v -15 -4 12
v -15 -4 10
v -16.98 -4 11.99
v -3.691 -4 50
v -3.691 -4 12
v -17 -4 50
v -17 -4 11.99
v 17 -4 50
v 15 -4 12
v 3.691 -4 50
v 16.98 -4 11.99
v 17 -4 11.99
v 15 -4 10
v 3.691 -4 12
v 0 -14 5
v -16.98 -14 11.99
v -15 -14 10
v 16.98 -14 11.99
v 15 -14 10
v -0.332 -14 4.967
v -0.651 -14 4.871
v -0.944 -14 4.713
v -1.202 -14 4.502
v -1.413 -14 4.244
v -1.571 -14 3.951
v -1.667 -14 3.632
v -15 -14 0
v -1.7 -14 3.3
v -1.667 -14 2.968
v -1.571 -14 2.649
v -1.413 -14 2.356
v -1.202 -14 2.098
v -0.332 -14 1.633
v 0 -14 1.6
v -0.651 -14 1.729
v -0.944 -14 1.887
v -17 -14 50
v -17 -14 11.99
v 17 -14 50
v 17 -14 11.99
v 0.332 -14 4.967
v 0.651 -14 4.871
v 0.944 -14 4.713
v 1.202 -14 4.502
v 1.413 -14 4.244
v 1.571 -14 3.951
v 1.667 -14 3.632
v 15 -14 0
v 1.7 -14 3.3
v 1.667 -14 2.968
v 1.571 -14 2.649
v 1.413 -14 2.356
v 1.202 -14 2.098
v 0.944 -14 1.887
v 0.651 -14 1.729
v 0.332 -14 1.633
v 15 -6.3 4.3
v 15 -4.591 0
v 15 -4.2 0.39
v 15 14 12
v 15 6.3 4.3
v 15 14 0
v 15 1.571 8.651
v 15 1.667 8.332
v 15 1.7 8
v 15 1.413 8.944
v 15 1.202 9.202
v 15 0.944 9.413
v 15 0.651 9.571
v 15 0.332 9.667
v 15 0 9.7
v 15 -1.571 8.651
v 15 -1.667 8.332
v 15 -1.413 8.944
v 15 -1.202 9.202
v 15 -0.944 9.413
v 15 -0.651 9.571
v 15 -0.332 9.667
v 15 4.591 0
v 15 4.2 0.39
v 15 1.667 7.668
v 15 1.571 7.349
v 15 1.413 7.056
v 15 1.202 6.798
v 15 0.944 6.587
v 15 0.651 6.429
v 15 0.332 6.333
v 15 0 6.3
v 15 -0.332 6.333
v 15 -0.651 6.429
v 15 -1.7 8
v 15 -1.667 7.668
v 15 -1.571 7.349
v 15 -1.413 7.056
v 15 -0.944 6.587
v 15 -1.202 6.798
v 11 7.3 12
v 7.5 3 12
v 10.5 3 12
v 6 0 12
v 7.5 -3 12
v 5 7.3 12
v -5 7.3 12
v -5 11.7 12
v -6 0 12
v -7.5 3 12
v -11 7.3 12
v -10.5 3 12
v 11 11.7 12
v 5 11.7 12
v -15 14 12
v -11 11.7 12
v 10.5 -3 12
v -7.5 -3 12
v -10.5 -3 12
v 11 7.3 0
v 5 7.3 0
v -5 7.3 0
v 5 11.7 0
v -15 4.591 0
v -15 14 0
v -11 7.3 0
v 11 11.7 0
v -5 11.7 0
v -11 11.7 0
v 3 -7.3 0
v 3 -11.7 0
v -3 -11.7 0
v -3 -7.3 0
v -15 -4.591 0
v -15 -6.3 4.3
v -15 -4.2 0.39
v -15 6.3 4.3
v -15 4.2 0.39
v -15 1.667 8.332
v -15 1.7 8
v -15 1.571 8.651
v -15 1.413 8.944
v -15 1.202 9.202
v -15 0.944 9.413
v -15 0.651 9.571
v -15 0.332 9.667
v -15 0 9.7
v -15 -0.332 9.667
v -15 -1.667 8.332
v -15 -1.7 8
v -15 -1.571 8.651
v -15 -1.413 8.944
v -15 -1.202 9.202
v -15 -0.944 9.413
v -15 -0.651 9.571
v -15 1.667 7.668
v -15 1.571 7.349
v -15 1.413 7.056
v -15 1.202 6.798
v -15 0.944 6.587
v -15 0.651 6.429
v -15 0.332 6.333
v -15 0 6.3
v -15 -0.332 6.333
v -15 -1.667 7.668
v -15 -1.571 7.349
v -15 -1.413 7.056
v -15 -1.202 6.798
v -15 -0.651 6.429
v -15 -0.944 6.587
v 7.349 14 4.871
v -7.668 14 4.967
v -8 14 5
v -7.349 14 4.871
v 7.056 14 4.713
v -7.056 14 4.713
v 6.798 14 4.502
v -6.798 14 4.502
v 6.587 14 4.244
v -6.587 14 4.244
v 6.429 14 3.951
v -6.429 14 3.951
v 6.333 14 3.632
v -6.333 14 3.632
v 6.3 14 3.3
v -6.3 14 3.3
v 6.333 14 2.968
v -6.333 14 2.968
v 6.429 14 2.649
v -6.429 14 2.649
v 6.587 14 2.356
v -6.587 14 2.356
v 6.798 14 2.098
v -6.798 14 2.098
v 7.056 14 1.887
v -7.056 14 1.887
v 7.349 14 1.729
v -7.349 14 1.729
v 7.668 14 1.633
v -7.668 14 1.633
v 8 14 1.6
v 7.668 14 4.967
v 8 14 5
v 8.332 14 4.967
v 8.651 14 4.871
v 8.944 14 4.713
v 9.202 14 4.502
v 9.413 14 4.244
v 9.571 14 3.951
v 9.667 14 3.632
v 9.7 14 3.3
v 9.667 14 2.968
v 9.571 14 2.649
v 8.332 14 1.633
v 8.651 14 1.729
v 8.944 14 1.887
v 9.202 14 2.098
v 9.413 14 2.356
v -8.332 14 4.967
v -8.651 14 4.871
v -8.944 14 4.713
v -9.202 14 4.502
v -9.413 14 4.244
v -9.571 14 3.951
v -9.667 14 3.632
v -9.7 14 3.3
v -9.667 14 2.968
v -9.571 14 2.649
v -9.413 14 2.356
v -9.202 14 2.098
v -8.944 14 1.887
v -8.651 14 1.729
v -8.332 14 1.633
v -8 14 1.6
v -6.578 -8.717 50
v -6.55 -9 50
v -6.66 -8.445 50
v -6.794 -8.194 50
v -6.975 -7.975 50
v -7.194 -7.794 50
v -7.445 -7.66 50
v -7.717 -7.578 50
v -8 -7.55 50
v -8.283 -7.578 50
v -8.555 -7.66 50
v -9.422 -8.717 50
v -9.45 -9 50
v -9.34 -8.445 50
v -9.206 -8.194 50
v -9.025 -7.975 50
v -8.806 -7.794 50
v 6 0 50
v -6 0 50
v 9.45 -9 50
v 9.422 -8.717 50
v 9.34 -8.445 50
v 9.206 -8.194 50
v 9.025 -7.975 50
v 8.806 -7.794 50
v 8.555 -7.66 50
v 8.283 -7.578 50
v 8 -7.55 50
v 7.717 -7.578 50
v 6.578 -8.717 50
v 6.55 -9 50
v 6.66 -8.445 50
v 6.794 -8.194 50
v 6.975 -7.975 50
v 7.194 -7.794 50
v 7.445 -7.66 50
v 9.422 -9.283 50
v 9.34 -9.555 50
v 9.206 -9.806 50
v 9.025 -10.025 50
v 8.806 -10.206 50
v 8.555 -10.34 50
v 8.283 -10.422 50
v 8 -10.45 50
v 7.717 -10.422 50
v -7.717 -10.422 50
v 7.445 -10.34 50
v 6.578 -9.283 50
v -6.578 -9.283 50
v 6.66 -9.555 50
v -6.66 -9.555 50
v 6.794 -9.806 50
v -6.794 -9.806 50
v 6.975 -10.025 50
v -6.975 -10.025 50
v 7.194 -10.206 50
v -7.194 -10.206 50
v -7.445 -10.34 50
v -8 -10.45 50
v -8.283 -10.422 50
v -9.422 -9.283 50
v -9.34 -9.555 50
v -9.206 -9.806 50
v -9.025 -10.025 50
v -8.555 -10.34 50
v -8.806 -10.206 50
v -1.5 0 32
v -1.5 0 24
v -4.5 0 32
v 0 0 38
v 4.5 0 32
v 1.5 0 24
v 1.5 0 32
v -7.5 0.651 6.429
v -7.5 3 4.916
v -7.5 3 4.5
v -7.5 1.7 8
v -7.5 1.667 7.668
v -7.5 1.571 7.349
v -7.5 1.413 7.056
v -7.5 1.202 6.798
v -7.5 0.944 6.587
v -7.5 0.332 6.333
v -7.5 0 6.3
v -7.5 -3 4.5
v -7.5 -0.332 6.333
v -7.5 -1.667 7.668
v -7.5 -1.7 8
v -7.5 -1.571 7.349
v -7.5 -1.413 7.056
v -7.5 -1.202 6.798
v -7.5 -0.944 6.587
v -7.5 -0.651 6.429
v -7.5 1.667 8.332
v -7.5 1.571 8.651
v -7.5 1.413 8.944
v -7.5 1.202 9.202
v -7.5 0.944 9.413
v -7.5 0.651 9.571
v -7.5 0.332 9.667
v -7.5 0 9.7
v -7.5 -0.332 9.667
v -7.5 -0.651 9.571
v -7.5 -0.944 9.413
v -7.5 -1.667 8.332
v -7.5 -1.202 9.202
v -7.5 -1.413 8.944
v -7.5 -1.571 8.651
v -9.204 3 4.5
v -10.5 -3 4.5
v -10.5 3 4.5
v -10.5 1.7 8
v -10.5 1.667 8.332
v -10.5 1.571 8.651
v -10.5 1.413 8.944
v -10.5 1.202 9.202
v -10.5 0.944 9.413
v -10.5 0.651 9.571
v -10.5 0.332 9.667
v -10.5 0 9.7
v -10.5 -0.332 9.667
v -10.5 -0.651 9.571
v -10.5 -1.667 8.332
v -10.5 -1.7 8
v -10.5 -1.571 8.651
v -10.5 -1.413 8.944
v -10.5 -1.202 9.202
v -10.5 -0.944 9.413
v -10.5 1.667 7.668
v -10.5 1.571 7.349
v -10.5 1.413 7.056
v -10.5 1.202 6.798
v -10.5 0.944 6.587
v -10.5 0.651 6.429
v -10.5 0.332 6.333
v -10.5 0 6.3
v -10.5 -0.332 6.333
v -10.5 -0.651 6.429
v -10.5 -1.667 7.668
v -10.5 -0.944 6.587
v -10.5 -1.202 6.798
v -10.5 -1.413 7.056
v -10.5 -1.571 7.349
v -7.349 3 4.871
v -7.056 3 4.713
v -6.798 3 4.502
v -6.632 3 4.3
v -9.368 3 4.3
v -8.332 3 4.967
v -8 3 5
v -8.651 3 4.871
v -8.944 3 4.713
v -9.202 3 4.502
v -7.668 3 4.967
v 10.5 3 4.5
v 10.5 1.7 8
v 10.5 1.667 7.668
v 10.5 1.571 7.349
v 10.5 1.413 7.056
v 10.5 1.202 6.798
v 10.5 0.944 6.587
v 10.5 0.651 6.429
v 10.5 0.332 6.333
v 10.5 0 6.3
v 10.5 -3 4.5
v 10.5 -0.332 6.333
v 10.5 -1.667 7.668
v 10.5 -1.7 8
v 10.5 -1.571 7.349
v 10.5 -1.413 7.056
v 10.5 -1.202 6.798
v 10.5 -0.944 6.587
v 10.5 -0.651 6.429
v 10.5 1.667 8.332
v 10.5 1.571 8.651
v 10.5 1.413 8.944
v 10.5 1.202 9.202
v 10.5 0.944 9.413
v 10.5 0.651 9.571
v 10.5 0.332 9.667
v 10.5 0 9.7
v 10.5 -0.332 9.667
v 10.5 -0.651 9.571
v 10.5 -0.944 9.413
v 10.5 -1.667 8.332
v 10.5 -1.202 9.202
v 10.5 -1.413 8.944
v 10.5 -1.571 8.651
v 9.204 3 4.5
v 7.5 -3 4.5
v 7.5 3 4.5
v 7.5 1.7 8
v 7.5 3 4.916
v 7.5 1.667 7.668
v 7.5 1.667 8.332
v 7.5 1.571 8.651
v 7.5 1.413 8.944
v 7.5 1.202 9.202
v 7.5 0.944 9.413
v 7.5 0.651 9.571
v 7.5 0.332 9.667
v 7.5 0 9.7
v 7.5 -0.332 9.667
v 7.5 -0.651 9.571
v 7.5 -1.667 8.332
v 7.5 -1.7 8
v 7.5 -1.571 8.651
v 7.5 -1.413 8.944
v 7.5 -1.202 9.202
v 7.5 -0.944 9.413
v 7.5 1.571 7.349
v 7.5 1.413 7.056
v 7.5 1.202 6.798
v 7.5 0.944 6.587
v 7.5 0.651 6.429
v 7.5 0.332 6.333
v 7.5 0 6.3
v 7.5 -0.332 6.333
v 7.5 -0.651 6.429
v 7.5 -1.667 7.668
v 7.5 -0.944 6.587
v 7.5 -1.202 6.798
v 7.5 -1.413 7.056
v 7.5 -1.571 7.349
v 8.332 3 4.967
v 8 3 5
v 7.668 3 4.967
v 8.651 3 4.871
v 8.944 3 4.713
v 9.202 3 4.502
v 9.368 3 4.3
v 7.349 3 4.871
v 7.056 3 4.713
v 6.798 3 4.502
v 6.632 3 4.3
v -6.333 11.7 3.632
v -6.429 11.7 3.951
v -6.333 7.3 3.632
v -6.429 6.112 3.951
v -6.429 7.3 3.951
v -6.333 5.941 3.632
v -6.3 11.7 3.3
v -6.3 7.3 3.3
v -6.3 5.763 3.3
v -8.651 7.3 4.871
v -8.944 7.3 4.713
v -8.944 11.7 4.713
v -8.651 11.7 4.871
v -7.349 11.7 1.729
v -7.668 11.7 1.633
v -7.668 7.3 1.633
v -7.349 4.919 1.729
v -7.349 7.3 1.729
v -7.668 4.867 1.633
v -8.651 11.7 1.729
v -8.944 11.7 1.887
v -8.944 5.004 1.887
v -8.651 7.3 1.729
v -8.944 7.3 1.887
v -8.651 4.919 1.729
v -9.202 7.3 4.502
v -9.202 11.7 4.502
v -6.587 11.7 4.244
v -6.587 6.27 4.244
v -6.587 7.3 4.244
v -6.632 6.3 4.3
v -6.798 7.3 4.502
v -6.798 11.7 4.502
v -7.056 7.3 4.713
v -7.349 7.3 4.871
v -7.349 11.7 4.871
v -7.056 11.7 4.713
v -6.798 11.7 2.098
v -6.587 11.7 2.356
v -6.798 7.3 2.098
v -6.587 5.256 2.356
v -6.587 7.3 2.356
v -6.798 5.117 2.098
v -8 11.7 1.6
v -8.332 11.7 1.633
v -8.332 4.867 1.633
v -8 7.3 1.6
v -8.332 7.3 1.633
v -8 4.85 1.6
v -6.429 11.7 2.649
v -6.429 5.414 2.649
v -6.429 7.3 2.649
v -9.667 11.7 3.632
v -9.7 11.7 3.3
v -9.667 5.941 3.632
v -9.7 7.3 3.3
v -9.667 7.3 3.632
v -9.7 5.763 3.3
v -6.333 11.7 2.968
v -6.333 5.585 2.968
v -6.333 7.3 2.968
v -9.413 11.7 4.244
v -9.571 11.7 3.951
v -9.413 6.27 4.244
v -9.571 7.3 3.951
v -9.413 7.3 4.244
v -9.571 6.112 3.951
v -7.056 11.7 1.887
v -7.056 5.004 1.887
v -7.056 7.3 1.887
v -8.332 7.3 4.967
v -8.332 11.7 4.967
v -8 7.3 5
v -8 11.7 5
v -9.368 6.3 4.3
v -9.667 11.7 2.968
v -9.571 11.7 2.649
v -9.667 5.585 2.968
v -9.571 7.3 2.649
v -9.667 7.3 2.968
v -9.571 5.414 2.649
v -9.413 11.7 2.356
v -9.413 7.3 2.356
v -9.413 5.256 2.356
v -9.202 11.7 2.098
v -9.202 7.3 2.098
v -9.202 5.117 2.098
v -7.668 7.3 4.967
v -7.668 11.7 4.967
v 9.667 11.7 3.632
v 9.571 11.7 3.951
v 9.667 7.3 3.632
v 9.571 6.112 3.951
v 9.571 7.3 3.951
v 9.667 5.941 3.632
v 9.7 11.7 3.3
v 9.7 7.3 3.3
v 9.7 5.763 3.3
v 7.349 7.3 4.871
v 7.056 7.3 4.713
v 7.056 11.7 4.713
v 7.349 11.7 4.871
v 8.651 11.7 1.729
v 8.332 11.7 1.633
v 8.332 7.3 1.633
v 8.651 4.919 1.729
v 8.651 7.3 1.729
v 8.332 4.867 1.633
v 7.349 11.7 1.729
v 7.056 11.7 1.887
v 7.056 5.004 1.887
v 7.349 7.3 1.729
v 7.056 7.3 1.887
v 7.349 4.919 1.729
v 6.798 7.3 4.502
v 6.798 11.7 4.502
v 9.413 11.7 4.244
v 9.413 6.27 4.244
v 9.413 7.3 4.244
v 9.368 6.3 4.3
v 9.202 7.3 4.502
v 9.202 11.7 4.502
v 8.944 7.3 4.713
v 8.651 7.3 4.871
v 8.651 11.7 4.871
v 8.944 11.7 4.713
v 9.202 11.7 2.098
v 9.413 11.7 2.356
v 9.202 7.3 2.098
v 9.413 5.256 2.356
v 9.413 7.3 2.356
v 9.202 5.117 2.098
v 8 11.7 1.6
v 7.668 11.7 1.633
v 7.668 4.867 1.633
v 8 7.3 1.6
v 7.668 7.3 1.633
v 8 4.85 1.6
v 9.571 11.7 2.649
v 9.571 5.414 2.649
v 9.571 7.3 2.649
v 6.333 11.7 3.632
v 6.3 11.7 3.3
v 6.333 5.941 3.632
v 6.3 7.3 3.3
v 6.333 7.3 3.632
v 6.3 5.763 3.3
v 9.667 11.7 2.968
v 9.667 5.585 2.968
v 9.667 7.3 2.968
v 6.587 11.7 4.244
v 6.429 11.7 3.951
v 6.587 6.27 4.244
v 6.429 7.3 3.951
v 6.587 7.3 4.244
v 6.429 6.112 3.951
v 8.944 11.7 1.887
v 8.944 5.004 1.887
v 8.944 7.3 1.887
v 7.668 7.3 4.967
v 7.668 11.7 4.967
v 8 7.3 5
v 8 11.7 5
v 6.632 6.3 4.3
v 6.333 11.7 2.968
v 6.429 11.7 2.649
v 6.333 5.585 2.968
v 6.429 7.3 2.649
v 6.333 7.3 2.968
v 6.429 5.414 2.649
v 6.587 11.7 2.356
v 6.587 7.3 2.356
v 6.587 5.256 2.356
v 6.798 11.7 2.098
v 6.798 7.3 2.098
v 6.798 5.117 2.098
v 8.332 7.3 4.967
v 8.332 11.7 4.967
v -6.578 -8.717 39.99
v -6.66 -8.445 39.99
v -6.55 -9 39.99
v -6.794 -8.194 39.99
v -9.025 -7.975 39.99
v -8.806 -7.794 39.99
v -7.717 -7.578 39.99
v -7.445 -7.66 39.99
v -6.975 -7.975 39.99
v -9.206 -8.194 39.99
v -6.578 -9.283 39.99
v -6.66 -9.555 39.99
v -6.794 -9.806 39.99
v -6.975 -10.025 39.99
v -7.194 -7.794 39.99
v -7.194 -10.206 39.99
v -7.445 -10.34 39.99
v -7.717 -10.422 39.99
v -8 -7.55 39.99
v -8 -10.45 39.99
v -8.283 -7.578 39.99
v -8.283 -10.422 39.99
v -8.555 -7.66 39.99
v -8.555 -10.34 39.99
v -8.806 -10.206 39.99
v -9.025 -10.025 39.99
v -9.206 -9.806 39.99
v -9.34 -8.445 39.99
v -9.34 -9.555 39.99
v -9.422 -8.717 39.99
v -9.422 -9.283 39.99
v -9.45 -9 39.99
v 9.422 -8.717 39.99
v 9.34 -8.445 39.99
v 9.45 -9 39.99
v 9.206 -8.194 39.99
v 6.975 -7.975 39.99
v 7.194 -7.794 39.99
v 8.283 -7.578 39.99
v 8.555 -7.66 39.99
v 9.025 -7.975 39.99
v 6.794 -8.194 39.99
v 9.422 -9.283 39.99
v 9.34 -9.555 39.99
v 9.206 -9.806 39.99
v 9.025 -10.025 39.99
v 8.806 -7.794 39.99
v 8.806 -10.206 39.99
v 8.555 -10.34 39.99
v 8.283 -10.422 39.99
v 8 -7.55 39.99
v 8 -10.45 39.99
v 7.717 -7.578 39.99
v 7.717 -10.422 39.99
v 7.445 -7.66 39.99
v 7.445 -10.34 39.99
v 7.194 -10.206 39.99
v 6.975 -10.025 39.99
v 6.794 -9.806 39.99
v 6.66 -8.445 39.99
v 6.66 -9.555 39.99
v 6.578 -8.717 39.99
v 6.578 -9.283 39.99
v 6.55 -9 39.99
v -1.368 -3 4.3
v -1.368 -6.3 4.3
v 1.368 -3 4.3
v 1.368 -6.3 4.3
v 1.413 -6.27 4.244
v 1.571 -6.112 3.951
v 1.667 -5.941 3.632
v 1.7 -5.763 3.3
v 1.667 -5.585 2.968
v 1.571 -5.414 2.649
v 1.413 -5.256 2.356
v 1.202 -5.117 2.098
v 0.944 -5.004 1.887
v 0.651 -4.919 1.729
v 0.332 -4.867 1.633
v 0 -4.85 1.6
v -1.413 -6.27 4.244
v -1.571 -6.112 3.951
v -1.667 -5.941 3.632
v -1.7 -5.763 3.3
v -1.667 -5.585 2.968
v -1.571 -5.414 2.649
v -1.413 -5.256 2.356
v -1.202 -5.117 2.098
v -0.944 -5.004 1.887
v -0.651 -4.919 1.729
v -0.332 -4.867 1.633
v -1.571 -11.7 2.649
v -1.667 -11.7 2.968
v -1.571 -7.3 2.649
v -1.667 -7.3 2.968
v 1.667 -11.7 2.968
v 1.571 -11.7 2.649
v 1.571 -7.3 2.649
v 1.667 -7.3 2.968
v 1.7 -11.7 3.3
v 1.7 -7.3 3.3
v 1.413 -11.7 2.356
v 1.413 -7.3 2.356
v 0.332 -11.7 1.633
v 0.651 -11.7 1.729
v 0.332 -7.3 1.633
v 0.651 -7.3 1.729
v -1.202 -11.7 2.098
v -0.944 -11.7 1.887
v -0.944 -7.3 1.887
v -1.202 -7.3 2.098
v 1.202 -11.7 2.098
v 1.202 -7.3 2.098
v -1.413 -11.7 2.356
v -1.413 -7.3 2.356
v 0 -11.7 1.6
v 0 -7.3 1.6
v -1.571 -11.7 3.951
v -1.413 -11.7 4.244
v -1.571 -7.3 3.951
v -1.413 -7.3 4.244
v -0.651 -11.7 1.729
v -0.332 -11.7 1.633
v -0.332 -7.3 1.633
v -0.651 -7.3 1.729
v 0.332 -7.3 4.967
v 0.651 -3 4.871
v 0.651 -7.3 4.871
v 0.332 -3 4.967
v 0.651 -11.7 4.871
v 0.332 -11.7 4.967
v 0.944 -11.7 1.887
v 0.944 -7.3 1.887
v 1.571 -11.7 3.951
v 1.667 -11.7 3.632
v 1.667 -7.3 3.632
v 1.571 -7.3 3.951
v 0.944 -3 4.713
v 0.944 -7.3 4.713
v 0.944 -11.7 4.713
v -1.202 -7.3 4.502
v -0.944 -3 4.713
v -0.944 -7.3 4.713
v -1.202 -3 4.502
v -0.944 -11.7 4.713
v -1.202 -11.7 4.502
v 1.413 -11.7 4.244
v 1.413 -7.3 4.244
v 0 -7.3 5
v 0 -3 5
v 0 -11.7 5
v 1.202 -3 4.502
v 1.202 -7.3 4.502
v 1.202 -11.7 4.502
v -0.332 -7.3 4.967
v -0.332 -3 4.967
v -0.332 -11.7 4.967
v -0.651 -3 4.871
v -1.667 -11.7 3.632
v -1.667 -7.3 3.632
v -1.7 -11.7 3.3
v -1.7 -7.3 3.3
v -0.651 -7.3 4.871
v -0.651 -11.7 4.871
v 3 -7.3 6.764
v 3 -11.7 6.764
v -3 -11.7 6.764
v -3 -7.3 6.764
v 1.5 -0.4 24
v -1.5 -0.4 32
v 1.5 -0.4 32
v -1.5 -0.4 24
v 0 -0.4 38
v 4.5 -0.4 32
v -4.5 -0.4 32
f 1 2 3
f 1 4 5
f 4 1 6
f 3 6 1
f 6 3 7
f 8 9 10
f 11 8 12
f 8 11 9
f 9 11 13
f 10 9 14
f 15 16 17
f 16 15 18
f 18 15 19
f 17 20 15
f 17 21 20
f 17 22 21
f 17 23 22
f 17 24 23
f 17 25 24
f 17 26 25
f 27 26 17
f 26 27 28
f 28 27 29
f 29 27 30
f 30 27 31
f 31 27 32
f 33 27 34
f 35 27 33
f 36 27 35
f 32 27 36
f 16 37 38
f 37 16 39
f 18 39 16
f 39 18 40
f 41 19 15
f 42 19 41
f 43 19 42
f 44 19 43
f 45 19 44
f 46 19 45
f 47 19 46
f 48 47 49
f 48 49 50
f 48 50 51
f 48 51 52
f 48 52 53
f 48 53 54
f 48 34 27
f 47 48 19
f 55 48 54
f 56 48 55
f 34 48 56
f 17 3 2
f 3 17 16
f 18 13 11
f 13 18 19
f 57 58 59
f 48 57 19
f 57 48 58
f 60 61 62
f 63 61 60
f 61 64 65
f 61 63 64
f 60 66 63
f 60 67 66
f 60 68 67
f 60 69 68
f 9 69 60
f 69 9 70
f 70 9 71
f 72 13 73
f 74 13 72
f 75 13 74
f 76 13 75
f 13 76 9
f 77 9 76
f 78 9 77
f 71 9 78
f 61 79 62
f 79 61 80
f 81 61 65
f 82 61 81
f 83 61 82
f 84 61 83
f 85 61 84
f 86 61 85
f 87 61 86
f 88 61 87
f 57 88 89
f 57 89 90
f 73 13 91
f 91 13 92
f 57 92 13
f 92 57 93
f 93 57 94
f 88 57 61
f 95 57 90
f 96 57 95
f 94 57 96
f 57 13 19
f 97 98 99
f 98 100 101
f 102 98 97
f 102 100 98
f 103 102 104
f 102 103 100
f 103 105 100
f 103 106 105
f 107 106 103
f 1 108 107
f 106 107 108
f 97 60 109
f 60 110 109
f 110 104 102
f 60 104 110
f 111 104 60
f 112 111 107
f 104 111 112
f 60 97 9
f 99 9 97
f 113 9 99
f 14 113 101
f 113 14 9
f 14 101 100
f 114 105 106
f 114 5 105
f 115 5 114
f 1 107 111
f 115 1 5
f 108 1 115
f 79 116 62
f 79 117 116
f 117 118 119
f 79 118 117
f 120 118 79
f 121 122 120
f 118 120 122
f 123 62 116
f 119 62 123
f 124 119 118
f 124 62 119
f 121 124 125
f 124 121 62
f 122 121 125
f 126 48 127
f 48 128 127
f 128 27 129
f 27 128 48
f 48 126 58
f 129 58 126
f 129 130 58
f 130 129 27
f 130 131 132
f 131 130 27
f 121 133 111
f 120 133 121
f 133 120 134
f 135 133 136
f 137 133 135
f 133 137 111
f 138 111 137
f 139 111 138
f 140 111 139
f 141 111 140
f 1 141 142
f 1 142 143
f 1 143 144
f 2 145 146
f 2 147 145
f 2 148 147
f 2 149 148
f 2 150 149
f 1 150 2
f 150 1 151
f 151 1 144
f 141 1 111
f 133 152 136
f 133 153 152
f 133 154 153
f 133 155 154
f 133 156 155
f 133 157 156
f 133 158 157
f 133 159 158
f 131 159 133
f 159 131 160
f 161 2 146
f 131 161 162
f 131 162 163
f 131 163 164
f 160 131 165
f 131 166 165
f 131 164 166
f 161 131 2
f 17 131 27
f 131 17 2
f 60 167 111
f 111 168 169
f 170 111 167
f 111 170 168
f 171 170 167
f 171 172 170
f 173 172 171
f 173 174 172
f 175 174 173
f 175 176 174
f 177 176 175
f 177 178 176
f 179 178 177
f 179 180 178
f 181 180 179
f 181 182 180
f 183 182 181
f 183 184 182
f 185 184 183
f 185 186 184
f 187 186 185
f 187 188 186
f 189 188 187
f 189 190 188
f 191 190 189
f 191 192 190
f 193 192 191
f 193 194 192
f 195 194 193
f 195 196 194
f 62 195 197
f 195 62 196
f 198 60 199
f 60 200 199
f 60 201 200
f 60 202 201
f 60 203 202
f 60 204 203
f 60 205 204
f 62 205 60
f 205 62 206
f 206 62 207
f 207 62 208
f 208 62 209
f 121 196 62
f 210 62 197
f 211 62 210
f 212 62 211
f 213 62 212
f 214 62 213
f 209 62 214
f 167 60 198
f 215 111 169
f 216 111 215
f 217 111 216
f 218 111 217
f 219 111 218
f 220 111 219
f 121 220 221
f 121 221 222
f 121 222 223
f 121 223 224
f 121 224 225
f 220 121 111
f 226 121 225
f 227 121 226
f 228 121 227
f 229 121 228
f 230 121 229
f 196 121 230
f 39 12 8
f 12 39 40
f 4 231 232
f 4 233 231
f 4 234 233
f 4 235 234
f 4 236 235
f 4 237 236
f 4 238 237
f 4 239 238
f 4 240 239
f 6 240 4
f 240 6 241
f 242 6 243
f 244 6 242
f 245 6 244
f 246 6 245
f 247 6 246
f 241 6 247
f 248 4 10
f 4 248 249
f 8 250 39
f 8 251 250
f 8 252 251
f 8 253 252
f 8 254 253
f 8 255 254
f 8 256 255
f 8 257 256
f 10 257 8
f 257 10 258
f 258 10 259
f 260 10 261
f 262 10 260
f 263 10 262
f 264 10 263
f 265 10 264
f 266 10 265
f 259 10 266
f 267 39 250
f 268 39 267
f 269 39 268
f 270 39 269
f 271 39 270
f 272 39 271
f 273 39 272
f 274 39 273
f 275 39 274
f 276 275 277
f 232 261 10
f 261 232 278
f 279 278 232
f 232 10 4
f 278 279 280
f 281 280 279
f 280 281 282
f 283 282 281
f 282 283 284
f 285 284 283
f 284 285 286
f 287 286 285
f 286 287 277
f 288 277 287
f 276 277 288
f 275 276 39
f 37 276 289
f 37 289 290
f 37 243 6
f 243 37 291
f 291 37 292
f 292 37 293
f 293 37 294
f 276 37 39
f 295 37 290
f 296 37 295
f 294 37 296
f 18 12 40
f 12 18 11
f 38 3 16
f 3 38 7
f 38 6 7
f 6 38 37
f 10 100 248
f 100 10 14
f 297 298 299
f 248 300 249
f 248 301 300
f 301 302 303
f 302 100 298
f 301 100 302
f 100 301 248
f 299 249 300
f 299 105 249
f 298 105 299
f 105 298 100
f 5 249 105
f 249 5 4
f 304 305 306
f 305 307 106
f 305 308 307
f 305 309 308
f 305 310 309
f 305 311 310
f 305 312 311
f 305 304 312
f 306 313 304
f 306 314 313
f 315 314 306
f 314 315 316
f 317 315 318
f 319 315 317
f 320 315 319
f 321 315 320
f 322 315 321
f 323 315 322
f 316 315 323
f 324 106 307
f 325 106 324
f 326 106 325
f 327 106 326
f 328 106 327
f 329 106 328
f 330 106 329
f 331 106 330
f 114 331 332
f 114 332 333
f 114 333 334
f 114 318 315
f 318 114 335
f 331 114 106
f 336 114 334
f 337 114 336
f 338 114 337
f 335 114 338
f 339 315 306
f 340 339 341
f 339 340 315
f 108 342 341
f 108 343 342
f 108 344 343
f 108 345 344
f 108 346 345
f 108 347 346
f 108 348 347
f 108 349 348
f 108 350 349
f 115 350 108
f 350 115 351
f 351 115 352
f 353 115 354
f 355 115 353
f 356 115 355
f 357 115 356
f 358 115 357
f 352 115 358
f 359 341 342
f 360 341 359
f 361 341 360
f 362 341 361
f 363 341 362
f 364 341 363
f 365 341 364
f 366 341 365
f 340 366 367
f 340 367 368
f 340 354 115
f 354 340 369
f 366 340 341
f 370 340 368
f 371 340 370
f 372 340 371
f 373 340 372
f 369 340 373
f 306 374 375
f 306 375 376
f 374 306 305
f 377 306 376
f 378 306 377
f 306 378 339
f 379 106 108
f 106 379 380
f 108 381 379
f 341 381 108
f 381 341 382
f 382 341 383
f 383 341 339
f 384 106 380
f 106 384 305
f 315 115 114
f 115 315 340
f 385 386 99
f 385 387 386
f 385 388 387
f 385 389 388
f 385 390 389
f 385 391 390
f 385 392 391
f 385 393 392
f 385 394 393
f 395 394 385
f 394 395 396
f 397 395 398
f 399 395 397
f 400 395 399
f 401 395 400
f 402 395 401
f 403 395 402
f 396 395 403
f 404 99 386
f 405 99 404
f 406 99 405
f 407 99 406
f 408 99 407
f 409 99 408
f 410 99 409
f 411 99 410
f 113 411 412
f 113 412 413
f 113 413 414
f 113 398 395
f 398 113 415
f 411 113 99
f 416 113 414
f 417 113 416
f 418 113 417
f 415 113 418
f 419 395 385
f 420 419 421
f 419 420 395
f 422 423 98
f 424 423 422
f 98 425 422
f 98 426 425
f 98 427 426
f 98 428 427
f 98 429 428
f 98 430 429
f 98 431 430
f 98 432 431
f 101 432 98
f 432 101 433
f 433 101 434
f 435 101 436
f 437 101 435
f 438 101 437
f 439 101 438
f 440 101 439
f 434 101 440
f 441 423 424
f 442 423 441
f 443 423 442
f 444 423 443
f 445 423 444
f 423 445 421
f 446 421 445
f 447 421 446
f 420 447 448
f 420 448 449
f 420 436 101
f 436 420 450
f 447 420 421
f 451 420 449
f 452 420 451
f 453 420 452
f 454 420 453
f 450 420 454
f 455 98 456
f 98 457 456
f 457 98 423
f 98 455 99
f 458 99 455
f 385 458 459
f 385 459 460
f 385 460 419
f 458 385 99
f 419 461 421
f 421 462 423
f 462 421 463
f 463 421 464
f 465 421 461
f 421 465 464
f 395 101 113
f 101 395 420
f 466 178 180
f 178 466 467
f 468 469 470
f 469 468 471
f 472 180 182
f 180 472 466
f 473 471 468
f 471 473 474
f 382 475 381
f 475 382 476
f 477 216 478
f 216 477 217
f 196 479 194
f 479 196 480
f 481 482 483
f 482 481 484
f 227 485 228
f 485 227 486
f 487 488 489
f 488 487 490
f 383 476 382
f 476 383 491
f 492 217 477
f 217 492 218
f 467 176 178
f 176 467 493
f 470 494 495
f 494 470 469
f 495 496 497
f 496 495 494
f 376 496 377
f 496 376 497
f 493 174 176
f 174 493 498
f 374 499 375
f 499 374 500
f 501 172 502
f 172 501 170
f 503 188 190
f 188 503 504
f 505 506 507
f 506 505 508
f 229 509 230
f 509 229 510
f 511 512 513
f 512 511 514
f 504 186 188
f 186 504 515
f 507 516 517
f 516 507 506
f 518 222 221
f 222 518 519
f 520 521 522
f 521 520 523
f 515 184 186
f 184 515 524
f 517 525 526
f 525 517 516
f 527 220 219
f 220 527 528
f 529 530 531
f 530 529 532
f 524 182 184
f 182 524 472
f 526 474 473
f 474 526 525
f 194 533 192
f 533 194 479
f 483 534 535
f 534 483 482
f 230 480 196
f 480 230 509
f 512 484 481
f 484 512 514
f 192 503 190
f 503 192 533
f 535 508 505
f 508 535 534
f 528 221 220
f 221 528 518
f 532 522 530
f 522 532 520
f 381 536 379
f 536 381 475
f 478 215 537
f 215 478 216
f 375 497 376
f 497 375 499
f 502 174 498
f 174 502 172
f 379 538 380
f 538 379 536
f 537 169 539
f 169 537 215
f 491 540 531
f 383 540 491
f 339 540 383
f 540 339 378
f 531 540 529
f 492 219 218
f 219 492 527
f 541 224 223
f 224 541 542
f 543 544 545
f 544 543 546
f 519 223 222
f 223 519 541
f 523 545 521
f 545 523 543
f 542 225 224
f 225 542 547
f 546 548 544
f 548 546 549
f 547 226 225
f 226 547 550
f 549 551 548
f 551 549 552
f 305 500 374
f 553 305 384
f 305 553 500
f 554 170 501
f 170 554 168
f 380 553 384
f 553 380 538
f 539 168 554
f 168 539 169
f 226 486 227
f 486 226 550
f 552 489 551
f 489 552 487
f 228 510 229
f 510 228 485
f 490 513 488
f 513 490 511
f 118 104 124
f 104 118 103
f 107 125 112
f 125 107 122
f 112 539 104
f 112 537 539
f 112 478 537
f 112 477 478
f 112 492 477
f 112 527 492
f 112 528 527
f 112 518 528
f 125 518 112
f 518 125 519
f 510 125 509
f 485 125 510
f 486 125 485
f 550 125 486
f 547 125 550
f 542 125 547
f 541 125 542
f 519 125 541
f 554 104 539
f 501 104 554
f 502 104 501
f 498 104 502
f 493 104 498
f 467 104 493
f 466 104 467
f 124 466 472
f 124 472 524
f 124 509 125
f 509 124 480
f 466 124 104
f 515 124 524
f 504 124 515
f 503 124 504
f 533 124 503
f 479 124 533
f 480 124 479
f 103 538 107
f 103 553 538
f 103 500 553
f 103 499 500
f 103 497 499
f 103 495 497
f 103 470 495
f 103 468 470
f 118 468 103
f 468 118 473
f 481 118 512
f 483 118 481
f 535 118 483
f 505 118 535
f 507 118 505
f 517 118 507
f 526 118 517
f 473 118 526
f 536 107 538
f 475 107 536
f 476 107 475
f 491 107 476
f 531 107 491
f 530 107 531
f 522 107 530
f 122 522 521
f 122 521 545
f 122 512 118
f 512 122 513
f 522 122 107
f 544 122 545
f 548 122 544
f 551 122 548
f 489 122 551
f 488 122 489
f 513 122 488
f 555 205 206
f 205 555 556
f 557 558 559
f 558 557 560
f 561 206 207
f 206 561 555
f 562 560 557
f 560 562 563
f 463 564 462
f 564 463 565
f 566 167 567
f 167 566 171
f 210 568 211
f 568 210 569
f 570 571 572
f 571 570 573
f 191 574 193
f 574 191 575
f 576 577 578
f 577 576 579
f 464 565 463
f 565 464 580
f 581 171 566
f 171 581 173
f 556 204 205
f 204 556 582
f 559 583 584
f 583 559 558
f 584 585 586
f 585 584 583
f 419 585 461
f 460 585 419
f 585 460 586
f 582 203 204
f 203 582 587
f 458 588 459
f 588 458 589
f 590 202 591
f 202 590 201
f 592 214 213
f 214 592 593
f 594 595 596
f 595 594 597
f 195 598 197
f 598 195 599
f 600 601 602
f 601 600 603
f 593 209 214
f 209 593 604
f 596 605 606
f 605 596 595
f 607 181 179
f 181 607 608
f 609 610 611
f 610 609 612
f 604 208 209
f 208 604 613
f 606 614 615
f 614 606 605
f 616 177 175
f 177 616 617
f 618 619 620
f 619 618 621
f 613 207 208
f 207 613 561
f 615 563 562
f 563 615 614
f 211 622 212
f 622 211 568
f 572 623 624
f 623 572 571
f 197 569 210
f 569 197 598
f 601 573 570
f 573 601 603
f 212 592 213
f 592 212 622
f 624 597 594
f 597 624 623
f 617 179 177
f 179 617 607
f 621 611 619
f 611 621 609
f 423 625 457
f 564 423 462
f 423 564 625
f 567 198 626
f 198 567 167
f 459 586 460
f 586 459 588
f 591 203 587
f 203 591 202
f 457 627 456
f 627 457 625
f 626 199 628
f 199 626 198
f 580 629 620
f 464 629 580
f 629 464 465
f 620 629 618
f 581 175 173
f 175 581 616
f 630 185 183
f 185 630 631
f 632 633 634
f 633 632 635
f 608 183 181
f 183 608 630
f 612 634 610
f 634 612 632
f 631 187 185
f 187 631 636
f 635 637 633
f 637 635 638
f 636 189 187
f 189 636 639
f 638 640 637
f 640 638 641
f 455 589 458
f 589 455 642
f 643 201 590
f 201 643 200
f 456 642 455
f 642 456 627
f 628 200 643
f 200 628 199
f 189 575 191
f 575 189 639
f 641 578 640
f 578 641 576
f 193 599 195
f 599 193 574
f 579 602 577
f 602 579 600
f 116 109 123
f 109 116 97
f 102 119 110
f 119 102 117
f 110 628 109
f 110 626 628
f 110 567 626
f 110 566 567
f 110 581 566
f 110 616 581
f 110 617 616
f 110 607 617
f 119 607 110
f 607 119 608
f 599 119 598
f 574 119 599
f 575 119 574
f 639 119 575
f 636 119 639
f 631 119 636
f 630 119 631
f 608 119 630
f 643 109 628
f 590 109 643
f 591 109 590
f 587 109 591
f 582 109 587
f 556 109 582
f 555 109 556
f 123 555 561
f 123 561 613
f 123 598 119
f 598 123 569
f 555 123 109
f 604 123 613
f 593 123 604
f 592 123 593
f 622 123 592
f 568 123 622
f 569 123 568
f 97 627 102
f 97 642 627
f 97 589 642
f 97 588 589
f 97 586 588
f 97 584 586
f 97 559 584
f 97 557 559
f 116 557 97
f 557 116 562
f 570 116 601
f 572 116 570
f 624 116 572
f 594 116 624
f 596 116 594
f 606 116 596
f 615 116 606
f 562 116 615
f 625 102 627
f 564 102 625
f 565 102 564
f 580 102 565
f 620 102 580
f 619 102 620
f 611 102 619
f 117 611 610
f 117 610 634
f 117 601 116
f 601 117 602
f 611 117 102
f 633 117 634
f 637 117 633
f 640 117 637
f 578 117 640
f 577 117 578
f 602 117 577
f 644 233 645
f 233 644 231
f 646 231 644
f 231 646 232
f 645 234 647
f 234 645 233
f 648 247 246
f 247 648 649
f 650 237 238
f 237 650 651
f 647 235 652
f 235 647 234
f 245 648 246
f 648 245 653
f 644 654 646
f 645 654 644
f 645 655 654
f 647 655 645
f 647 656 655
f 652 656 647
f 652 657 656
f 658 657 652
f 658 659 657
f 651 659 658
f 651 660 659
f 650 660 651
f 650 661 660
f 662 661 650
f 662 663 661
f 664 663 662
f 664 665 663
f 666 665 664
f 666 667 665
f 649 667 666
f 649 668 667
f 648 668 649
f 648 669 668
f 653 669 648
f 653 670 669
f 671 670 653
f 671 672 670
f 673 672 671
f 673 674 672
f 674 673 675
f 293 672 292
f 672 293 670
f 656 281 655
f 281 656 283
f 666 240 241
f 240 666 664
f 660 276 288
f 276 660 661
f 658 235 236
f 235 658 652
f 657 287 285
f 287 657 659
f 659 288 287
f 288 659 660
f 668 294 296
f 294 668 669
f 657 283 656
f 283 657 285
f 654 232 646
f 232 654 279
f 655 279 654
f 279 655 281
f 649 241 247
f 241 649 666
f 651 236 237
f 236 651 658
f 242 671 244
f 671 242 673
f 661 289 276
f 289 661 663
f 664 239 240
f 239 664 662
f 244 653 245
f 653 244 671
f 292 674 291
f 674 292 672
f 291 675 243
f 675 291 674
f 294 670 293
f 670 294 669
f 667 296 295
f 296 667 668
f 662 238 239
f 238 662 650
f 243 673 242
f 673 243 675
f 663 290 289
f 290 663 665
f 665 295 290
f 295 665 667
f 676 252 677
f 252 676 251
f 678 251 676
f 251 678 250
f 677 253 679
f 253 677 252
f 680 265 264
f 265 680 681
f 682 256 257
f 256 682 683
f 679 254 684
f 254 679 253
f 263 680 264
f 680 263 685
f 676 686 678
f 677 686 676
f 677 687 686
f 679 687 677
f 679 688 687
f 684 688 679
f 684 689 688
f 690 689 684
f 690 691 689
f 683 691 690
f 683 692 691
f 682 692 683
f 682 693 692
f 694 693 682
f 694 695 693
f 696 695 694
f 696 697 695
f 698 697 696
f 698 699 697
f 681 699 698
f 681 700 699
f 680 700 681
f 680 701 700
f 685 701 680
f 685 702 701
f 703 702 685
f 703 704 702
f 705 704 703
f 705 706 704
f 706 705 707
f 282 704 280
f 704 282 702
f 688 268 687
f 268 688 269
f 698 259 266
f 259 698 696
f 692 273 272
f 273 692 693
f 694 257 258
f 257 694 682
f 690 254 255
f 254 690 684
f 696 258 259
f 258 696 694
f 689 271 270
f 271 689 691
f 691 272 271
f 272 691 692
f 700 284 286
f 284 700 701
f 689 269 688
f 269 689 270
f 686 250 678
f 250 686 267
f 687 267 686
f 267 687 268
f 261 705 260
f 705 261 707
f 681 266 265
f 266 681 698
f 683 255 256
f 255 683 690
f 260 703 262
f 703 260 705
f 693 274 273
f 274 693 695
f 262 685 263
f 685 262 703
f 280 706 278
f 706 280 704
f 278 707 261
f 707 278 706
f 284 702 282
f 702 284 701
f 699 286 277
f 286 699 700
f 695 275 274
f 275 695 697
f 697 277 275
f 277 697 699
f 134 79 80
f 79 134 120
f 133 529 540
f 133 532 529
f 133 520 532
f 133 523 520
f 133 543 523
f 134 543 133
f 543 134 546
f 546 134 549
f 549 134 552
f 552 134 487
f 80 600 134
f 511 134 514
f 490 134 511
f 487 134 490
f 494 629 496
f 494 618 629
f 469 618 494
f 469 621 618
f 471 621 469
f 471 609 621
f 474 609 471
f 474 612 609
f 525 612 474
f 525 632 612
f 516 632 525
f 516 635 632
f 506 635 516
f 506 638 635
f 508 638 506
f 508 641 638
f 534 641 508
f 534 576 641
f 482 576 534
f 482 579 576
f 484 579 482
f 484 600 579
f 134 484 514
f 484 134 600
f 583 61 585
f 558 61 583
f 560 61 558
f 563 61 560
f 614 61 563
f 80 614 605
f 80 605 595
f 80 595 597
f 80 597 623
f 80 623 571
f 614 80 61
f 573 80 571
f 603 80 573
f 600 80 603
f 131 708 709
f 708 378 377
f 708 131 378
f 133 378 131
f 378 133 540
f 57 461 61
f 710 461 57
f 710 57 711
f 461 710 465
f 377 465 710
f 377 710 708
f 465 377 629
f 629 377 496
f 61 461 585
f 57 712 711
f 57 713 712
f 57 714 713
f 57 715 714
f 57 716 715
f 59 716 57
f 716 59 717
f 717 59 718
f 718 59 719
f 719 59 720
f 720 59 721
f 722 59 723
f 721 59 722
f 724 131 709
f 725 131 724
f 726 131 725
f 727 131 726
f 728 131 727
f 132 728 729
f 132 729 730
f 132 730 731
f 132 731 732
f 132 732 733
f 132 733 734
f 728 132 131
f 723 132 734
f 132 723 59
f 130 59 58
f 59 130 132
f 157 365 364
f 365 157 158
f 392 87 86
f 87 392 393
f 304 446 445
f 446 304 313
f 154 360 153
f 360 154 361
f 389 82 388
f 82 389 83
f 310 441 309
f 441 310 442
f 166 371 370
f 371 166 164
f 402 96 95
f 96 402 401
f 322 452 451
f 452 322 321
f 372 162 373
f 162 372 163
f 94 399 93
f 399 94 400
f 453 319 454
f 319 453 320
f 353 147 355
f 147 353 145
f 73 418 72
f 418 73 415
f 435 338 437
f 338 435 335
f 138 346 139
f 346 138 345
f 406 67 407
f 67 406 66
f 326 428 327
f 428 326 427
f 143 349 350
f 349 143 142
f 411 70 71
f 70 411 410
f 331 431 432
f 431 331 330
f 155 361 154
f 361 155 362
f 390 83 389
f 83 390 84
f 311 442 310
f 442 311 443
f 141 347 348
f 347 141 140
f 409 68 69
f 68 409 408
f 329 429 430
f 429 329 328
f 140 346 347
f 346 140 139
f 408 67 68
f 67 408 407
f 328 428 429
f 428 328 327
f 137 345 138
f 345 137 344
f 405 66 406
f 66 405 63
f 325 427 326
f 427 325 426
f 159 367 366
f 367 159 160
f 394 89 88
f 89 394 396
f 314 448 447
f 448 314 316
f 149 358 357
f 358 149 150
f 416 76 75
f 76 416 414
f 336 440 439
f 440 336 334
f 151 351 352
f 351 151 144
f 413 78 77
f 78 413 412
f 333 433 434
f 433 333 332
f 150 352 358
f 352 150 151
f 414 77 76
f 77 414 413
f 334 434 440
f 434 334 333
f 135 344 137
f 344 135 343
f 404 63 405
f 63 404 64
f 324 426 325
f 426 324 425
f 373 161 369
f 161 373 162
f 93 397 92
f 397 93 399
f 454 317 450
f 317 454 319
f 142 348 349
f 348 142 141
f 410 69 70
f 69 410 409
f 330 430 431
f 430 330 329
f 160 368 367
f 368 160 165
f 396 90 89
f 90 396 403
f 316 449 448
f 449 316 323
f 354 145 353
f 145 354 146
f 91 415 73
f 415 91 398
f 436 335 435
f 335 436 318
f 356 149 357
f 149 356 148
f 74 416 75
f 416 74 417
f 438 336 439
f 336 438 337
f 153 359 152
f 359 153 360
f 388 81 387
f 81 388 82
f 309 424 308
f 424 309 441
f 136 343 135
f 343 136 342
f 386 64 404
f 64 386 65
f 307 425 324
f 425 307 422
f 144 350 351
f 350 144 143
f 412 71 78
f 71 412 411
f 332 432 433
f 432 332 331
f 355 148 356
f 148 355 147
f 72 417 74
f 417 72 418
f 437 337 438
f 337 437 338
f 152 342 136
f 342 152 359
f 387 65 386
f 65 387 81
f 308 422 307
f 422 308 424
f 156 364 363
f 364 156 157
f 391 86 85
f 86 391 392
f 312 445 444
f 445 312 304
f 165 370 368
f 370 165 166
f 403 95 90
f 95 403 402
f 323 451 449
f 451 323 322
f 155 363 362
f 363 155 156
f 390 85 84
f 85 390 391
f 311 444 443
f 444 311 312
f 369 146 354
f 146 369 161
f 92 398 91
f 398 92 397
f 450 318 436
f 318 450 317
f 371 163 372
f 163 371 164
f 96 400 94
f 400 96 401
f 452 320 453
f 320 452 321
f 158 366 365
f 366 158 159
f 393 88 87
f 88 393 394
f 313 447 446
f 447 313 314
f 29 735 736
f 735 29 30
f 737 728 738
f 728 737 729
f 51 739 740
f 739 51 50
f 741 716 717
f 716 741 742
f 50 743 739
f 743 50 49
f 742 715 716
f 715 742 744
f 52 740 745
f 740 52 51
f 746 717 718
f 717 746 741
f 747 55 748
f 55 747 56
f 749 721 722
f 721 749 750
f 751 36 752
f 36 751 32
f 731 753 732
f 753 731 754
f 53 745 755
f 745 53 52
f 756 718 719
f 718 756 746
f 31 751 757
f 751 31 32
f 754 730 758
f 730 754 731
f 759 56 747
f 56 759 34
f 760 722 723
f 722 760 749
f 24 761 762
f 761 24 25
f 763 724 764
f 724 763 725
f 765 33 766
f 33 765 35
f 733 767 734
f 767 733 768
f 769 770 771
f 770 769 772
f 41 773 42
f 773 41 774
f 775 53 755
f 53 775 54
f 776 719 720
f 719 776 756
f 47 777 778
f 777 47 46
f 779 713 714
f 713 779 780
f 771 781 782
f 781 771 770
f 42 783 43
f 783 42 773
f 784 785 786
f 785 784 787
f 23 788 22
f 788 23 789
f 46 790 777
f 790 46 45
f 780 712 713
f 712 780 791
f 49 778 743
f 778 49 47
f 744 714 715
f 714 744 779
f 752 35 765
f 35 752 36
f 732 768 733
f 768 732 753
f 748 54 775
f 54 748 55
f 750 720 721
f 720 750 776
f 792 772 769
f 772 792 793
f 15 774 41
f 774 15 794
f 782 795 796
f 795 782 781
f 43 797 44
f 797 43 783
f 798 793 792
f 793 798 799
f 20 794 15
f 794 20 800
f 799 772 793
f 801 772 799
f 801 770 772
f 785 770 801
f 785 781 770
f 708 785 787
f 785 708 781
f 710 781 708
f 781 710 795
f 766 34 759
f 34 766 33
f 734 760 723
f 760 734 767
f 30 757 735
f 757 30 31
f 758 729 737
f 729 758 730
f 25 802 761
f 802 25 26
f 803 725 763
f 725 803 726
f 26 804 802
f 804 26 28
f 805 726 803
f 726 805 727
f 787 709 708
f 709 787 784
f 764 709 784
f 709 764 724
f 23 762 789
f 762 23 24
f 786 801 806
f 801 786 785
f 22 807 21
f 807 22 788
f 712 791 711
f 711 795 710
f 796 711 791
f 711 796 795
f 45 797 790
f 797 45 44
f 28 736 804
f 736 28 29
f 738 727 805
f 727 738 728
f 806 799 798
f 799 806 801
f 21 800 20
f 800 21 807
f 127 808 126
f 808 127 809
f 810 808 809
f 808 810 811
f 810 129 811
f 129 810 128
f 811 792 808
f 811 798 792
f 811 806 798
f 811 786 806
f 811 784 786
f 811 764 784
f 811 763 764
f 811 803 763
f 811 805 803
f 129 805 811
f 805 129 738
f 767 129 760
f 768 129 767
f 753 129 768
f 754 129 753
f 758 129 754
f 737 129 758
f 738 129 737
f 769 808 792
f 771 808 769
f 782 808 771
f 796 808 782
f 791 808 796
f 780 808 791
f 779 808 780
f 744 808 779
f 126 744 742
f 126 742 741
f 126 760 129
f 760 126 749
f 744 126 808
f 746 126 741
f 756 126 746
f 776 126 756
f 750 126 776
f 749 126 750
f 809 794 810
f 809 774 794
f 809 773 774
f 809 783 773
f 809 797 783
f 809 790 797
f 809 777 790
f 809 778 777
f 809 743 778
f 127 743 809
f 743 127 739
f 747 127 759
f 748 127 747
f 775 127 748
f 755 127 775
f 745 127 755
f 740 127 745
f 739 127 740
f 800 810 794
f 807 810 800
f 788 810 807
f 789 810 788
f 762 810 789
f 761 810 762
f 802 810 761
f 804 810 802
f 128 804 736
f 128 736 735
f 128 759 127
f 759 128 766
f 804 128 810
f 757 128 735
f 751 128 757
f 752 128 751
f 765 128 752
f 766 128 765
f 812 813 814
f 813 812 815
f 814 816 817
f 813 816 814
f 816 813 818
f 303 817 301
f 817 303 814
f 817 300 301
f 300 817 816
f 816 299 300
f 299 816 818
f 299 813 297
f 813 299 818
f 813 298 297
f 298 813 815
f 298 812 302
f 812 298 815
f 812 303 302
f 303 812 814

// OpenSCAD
// Positioning stage x-slider + column. Print upright as shown. Qty 3.
// Symmetric about its centre, so the same part serves both towers: the X
// adjust nut goes in the slot at the end facing the base's screw tab.
include <../stage.scad>

translate([-xs_xc, 0, -stage_base_h]) stage_x_slider();
